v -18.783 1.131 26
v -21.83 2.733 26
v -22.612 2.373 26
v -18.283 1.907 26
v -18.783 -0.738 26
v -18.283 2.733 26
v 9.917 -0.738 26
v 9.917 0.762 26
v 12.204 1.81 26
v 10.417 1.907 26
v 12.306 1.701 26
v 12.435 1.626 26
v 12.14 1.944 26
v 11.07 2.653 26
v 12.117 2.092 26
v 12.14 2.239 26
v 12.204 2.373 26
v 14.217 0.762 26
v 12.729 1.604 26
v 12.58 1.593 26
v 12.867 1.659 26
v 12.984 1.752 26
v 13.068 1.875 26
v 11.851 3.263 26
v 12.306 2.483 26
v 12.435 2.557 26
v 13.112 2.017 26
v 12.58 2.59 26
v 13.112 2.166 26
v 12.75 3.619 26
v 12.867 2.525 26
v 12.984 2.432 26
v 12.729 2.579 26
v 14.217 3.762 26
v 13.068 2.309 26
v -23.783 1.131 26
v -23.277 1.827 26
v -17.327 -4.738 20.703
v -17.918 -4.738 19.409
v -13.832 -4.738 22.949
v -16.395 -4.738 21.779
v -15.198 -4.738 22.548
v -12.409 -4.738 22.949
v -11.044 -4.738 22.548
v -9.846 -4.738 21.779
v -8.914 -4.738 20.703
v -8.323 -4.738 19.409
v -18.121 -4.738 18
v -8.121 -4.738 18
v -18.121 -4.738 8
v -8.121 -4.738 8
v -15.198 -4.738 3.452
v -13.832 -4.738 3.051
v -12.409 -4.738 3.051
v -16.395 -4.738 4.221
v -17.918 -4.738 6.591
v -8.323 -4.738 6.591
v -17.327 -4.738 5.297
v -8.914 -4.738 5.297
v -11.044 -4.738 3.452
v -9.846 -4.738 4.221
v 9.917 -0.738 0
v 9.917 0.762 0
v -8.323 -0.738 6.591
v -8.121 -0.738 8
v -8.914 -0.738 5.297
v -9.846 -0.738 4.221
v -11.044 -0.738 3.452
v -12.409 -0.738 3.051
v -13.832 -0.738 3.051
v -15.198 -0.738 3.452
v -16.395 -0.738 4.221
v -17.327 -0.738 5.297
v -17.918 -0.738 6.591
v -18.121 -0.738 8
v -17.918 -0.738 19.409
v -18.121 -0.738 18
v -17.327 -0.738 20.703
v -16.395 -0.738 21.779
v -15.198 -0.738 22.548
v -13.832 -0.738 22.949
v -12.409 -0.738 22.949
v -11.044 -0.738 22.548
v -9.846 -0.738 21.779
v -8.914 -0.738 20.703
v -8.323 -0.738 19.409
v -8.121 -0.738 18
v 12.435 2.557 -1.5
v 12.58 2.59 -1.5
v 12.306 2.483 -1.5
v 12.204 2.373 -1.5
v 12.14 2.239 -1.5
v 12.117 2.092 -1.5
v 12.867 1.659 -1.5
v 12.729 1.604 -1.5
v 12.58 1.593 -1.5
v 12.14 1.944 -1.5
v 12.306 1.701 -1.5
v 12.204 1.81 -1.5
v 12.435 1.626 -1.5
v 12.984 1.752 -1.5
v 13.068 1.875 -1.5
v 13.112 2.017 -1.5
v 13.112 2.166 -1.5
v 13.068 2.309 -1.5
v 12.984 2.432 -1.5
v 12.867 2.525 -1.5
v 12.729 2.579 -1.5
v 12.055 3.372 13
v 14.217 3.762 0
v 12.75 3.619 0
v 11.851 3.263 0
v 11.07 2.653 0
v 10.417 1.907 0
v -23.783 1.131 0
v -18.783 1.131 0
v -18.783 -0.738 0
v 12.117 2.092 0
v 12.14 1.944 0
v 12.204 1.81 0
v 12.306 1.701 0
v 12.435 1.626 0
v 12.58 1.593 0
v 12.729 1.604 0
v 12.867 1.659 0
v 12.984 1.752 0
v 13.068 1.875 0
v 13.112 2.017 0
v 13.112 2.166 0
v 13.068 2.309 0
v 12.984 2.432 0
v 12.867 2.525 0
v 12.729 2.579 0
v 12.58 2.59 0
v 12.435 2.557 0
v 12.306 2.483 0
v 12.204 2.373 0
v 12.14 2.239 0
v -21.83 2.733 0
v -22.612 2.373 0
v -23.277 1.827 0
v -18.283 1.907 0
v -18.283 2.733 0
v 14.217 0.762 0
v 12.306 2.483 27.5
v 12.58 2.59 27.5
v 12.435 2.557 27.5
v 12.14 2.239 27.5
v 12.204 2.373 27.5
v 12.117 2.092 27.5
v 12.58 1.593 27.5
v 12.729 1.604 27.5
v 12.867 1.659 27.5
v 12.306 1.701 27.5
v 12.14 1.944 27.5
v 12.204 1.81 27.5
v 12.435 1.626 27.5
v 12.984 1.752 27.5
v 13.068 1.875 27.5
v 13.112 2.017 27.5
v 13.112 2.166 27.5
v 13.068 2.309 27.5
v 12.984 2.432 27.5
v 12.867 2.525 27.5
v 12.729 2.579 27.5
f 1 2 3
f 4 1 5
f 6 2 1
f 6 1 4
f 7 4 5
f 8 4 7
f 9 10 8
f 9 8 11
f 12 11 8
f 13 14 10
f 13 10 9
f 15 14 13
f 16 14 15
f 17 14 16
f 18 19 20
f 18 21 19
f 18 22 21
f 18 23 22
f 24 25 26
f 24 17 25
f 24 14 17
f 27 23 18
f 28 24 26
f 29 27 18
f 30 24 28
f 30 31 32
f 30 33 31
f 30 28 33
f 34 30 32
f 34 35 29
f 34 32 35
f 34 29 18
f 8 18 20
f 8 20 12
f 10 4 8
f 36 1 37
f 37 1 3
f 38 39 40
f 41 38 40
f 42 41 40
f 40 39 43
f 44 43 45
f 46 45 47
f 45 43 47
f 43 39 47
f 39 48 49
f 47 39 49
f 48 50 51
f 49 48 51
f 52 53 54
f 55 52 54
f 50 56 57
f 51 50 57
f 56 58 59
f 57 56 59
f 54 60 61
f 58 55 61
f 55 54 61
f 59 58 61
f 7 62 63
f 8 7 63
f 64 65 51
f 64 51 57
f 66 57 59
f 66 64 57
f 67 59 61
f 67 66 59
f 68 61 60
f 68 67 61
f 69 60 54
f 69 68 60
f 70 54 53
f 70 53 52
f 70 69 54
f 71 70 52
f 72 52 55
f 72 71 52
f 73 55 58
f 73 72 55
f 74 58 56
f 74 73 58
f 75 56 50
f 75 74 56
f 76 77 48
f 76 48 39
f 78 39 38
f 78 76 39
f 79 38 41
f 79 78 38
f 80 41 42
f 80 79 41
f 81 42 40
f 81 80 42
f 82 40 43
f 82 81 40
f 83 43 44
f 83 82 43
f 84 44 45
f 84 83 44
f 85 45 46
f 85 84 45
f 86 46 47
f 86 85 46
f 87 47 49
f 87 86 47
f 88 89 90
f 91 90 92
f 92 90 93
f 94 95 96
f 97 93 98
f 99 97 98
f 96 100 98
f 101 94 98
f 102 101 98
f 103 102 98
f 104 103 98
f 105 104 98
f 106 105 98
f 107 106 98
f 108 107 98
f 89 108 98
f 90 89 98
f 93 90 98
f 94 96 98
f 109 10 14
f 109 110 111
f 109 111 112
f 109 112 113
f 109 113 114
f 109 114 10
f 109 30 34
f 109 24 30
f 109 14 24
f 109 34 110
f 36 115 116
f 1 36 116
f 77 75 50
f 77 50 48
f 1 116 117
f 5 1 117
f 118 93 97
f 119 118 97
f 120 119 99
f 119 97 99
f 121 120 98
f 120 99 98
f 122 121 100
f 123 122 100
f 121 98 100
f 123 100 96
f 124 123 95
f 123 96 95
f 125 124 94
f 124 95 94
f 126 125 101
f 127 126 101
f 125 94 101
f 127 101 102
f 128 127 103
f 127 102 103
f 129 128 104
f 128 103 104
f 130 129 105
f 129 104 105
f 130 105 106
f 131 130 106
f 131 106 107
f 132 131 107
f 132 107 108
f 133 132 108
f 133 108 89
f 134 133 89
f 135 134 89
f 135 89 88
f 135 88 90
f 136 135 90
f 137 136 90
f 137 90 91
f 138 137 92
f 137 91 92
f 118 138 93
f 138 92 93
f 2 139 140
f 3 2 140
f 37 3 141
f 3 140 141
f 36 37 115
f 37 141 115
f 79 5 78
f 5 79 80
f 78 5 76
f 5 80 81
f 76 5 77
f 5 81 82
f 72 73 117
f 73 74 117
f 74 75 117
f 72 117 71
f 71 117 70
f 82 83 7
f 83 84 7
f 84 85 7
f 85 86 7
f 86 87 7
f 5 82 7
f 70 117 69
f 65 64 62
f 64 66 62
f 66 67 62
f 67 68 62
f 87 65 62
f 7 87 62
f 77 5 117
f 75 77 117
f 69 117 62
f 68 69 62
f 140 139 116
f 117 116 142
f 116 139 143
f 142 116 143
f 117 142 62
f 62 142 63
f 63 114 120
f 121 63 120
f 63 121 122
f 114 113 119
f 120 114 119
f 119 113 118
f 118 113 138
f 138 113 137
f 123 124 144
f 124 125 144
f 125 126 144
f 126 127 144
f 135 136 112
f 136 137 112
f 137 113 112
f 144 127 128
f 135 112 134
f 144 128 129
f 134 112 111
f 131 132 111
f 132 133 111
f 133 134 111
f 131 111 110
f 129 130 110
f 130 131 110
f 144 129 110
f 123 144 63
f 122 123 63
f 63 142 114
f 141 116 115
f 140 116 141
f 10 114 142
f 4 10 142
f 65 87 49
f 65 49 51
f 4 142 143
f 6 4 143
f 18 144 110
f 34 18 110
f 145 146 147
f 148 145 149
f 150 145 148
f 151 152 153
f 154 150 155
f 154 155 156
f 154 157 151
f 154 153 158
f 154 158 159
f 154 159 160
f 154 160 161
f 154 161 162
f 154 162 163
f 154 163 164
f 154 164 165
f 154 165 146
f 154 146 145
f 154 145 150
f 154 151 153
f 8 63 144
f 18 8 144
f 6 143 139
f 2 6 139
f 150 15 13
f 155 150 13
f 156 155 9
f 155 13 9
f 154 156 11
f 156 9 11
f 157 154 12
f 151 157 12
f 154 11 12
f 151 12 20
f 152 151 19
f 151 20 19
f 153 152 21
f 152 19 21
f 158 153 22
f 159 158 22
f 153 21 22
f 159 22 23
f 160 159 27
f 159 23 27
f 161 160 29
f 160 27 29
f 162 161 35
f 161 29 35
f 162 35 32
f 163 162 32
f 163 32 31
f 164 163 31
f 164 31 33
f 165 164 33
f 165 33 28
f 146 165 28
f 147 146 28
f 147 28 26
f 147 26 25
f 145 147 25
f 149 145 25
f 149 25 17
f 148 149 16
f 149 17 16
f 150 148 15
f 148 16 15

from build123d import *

# Parameters (mm, degrees)
BOSS_EXTRUDE3_DEPTH = 26
FILLET6_START       = -1
FILLET6_DEPTH       = 28
BOSS_EXTRUDE5_DEPTH = 4
SKETCH6_R           = 0.5
BOSS_EXTRUDE6_DEPTH = 1.5
LPATTERN1_COUNT     = 2
LPATTERN1_PITCH     = 27.5


with BuildPart() as part:
    # Sketch4 → Boss-Extrude3 (new body)
    with BuildSketch(Plane.XY):
        with BuildLine():
            Line((-18.782676832, -0.738323828), (9.917323168, -0.738323828))
            Line((9.917323168, -0.738323828), (9.917323168, 0.761676172))
            Line((9.917323168, 0.761676172), (14.217323168, 0.761676172))
            Line((14.217323168, 0.761676172), (14.217323168, 3.761676172))
            Line((14.217323168, 3.761676172), (10.417323168, 3.761676172))
            Line((10.417323168, 3.761676172), (10.417323168, 1.907320096))
            Line((10.417323168, 1.907320096), (-18.282676832, 1.907320096))
            Line((-18.282676832, 1.907320096), (-18.282676832, 2.732812963))
            Line((-18.282676832, 2.732812963), (-21.829938074, 2.732812963))
            ThreePointArc((-21.829938074, 2.732812963), (-22.961793852, 2.121559656), (-23.782676832, 1.131166179))
            Line((-23.782676832, 1.131166179), (-18.782676832, 1.131166179))
            Line((-18.782676832, 1.131166179), (-18.782676832, -0.738323828))
        make_face()
    extrude(amount=BOSS_EXTRUDE3_DEPTH)

    # Fillet6: read off the stored shape, not the designer's step
    # Fillet6 outline → Fillet6 (cut)
    with BuildSketch(Plane.XY.offset(FILLET6_START)):
        with BuildLine():
            Line((10.417323168, 3.761676172), (10.417323168, 1.907320096))
            add(Edge.make_bspline(
                [(10.417323168, 1.907320096), (10.684335221, 2.237350554), (10.951347275, 2.567381012), (11.617088855, 3.247333717), (12.422778443, 3.640500924), (13.36841604, 3.74688263), (13.792869604, 3.754279401), (14.217323168, 3.761676172)],
                knots=[0, 0, 0, 0, 0, 0, 0.5, 0.5, 1, 1, 1, 1, 1, 1], degree=5))
            Line((14.217323168, 3.761676172), (10.417323168, 3.761676172))
        make_face()
    extrude(amount=FILLET6_DEPTH, mode=Mode.SUBTRACT)

    # Sketch5 → Boss-Extrude5 (add)
    with BuildSketch(Plane(origin=(0, -0.738323828, 0), x_dir=(-1, 0, 0), z_dir=(0, -1, 0))):
        with BuildLine():
            Line((18.120676832, -8), (18.120676832, -18))
            ThreePointArc((18.120676832, -18), (13.120676832, -23), (8.120676832, -18))
            Line((8.120676832, -18), (8.120676832, -8))
            ThreePointArc((8.120676832, -8), (13.120676832, -3), (18.120676832, -8))
        make_face()
    extrude(amount=BOSS_EXTRUDE5_DEPTH)

    # Sketch6 → Boss-Extrude6 (add)
    with BuildSketch(Plane.XY.offset(26)):
        with Locations(Location((12.617323168, 2.091676172, 0), (0, 0, 180))):
            Circle(SKETCH6_R)
    boss_extrude6 = extrude(amount=BOSS_EXTRUDE6_DEPTH)

    # LPattern1: Boss-Extrude6 ×2
    with Locations(*[(0, 0, -i * LPATTERN1_PITCH) for i in range(1, LPATTERN1_COUNT)]):
        add(boss_extrude6)


solid = part.part
